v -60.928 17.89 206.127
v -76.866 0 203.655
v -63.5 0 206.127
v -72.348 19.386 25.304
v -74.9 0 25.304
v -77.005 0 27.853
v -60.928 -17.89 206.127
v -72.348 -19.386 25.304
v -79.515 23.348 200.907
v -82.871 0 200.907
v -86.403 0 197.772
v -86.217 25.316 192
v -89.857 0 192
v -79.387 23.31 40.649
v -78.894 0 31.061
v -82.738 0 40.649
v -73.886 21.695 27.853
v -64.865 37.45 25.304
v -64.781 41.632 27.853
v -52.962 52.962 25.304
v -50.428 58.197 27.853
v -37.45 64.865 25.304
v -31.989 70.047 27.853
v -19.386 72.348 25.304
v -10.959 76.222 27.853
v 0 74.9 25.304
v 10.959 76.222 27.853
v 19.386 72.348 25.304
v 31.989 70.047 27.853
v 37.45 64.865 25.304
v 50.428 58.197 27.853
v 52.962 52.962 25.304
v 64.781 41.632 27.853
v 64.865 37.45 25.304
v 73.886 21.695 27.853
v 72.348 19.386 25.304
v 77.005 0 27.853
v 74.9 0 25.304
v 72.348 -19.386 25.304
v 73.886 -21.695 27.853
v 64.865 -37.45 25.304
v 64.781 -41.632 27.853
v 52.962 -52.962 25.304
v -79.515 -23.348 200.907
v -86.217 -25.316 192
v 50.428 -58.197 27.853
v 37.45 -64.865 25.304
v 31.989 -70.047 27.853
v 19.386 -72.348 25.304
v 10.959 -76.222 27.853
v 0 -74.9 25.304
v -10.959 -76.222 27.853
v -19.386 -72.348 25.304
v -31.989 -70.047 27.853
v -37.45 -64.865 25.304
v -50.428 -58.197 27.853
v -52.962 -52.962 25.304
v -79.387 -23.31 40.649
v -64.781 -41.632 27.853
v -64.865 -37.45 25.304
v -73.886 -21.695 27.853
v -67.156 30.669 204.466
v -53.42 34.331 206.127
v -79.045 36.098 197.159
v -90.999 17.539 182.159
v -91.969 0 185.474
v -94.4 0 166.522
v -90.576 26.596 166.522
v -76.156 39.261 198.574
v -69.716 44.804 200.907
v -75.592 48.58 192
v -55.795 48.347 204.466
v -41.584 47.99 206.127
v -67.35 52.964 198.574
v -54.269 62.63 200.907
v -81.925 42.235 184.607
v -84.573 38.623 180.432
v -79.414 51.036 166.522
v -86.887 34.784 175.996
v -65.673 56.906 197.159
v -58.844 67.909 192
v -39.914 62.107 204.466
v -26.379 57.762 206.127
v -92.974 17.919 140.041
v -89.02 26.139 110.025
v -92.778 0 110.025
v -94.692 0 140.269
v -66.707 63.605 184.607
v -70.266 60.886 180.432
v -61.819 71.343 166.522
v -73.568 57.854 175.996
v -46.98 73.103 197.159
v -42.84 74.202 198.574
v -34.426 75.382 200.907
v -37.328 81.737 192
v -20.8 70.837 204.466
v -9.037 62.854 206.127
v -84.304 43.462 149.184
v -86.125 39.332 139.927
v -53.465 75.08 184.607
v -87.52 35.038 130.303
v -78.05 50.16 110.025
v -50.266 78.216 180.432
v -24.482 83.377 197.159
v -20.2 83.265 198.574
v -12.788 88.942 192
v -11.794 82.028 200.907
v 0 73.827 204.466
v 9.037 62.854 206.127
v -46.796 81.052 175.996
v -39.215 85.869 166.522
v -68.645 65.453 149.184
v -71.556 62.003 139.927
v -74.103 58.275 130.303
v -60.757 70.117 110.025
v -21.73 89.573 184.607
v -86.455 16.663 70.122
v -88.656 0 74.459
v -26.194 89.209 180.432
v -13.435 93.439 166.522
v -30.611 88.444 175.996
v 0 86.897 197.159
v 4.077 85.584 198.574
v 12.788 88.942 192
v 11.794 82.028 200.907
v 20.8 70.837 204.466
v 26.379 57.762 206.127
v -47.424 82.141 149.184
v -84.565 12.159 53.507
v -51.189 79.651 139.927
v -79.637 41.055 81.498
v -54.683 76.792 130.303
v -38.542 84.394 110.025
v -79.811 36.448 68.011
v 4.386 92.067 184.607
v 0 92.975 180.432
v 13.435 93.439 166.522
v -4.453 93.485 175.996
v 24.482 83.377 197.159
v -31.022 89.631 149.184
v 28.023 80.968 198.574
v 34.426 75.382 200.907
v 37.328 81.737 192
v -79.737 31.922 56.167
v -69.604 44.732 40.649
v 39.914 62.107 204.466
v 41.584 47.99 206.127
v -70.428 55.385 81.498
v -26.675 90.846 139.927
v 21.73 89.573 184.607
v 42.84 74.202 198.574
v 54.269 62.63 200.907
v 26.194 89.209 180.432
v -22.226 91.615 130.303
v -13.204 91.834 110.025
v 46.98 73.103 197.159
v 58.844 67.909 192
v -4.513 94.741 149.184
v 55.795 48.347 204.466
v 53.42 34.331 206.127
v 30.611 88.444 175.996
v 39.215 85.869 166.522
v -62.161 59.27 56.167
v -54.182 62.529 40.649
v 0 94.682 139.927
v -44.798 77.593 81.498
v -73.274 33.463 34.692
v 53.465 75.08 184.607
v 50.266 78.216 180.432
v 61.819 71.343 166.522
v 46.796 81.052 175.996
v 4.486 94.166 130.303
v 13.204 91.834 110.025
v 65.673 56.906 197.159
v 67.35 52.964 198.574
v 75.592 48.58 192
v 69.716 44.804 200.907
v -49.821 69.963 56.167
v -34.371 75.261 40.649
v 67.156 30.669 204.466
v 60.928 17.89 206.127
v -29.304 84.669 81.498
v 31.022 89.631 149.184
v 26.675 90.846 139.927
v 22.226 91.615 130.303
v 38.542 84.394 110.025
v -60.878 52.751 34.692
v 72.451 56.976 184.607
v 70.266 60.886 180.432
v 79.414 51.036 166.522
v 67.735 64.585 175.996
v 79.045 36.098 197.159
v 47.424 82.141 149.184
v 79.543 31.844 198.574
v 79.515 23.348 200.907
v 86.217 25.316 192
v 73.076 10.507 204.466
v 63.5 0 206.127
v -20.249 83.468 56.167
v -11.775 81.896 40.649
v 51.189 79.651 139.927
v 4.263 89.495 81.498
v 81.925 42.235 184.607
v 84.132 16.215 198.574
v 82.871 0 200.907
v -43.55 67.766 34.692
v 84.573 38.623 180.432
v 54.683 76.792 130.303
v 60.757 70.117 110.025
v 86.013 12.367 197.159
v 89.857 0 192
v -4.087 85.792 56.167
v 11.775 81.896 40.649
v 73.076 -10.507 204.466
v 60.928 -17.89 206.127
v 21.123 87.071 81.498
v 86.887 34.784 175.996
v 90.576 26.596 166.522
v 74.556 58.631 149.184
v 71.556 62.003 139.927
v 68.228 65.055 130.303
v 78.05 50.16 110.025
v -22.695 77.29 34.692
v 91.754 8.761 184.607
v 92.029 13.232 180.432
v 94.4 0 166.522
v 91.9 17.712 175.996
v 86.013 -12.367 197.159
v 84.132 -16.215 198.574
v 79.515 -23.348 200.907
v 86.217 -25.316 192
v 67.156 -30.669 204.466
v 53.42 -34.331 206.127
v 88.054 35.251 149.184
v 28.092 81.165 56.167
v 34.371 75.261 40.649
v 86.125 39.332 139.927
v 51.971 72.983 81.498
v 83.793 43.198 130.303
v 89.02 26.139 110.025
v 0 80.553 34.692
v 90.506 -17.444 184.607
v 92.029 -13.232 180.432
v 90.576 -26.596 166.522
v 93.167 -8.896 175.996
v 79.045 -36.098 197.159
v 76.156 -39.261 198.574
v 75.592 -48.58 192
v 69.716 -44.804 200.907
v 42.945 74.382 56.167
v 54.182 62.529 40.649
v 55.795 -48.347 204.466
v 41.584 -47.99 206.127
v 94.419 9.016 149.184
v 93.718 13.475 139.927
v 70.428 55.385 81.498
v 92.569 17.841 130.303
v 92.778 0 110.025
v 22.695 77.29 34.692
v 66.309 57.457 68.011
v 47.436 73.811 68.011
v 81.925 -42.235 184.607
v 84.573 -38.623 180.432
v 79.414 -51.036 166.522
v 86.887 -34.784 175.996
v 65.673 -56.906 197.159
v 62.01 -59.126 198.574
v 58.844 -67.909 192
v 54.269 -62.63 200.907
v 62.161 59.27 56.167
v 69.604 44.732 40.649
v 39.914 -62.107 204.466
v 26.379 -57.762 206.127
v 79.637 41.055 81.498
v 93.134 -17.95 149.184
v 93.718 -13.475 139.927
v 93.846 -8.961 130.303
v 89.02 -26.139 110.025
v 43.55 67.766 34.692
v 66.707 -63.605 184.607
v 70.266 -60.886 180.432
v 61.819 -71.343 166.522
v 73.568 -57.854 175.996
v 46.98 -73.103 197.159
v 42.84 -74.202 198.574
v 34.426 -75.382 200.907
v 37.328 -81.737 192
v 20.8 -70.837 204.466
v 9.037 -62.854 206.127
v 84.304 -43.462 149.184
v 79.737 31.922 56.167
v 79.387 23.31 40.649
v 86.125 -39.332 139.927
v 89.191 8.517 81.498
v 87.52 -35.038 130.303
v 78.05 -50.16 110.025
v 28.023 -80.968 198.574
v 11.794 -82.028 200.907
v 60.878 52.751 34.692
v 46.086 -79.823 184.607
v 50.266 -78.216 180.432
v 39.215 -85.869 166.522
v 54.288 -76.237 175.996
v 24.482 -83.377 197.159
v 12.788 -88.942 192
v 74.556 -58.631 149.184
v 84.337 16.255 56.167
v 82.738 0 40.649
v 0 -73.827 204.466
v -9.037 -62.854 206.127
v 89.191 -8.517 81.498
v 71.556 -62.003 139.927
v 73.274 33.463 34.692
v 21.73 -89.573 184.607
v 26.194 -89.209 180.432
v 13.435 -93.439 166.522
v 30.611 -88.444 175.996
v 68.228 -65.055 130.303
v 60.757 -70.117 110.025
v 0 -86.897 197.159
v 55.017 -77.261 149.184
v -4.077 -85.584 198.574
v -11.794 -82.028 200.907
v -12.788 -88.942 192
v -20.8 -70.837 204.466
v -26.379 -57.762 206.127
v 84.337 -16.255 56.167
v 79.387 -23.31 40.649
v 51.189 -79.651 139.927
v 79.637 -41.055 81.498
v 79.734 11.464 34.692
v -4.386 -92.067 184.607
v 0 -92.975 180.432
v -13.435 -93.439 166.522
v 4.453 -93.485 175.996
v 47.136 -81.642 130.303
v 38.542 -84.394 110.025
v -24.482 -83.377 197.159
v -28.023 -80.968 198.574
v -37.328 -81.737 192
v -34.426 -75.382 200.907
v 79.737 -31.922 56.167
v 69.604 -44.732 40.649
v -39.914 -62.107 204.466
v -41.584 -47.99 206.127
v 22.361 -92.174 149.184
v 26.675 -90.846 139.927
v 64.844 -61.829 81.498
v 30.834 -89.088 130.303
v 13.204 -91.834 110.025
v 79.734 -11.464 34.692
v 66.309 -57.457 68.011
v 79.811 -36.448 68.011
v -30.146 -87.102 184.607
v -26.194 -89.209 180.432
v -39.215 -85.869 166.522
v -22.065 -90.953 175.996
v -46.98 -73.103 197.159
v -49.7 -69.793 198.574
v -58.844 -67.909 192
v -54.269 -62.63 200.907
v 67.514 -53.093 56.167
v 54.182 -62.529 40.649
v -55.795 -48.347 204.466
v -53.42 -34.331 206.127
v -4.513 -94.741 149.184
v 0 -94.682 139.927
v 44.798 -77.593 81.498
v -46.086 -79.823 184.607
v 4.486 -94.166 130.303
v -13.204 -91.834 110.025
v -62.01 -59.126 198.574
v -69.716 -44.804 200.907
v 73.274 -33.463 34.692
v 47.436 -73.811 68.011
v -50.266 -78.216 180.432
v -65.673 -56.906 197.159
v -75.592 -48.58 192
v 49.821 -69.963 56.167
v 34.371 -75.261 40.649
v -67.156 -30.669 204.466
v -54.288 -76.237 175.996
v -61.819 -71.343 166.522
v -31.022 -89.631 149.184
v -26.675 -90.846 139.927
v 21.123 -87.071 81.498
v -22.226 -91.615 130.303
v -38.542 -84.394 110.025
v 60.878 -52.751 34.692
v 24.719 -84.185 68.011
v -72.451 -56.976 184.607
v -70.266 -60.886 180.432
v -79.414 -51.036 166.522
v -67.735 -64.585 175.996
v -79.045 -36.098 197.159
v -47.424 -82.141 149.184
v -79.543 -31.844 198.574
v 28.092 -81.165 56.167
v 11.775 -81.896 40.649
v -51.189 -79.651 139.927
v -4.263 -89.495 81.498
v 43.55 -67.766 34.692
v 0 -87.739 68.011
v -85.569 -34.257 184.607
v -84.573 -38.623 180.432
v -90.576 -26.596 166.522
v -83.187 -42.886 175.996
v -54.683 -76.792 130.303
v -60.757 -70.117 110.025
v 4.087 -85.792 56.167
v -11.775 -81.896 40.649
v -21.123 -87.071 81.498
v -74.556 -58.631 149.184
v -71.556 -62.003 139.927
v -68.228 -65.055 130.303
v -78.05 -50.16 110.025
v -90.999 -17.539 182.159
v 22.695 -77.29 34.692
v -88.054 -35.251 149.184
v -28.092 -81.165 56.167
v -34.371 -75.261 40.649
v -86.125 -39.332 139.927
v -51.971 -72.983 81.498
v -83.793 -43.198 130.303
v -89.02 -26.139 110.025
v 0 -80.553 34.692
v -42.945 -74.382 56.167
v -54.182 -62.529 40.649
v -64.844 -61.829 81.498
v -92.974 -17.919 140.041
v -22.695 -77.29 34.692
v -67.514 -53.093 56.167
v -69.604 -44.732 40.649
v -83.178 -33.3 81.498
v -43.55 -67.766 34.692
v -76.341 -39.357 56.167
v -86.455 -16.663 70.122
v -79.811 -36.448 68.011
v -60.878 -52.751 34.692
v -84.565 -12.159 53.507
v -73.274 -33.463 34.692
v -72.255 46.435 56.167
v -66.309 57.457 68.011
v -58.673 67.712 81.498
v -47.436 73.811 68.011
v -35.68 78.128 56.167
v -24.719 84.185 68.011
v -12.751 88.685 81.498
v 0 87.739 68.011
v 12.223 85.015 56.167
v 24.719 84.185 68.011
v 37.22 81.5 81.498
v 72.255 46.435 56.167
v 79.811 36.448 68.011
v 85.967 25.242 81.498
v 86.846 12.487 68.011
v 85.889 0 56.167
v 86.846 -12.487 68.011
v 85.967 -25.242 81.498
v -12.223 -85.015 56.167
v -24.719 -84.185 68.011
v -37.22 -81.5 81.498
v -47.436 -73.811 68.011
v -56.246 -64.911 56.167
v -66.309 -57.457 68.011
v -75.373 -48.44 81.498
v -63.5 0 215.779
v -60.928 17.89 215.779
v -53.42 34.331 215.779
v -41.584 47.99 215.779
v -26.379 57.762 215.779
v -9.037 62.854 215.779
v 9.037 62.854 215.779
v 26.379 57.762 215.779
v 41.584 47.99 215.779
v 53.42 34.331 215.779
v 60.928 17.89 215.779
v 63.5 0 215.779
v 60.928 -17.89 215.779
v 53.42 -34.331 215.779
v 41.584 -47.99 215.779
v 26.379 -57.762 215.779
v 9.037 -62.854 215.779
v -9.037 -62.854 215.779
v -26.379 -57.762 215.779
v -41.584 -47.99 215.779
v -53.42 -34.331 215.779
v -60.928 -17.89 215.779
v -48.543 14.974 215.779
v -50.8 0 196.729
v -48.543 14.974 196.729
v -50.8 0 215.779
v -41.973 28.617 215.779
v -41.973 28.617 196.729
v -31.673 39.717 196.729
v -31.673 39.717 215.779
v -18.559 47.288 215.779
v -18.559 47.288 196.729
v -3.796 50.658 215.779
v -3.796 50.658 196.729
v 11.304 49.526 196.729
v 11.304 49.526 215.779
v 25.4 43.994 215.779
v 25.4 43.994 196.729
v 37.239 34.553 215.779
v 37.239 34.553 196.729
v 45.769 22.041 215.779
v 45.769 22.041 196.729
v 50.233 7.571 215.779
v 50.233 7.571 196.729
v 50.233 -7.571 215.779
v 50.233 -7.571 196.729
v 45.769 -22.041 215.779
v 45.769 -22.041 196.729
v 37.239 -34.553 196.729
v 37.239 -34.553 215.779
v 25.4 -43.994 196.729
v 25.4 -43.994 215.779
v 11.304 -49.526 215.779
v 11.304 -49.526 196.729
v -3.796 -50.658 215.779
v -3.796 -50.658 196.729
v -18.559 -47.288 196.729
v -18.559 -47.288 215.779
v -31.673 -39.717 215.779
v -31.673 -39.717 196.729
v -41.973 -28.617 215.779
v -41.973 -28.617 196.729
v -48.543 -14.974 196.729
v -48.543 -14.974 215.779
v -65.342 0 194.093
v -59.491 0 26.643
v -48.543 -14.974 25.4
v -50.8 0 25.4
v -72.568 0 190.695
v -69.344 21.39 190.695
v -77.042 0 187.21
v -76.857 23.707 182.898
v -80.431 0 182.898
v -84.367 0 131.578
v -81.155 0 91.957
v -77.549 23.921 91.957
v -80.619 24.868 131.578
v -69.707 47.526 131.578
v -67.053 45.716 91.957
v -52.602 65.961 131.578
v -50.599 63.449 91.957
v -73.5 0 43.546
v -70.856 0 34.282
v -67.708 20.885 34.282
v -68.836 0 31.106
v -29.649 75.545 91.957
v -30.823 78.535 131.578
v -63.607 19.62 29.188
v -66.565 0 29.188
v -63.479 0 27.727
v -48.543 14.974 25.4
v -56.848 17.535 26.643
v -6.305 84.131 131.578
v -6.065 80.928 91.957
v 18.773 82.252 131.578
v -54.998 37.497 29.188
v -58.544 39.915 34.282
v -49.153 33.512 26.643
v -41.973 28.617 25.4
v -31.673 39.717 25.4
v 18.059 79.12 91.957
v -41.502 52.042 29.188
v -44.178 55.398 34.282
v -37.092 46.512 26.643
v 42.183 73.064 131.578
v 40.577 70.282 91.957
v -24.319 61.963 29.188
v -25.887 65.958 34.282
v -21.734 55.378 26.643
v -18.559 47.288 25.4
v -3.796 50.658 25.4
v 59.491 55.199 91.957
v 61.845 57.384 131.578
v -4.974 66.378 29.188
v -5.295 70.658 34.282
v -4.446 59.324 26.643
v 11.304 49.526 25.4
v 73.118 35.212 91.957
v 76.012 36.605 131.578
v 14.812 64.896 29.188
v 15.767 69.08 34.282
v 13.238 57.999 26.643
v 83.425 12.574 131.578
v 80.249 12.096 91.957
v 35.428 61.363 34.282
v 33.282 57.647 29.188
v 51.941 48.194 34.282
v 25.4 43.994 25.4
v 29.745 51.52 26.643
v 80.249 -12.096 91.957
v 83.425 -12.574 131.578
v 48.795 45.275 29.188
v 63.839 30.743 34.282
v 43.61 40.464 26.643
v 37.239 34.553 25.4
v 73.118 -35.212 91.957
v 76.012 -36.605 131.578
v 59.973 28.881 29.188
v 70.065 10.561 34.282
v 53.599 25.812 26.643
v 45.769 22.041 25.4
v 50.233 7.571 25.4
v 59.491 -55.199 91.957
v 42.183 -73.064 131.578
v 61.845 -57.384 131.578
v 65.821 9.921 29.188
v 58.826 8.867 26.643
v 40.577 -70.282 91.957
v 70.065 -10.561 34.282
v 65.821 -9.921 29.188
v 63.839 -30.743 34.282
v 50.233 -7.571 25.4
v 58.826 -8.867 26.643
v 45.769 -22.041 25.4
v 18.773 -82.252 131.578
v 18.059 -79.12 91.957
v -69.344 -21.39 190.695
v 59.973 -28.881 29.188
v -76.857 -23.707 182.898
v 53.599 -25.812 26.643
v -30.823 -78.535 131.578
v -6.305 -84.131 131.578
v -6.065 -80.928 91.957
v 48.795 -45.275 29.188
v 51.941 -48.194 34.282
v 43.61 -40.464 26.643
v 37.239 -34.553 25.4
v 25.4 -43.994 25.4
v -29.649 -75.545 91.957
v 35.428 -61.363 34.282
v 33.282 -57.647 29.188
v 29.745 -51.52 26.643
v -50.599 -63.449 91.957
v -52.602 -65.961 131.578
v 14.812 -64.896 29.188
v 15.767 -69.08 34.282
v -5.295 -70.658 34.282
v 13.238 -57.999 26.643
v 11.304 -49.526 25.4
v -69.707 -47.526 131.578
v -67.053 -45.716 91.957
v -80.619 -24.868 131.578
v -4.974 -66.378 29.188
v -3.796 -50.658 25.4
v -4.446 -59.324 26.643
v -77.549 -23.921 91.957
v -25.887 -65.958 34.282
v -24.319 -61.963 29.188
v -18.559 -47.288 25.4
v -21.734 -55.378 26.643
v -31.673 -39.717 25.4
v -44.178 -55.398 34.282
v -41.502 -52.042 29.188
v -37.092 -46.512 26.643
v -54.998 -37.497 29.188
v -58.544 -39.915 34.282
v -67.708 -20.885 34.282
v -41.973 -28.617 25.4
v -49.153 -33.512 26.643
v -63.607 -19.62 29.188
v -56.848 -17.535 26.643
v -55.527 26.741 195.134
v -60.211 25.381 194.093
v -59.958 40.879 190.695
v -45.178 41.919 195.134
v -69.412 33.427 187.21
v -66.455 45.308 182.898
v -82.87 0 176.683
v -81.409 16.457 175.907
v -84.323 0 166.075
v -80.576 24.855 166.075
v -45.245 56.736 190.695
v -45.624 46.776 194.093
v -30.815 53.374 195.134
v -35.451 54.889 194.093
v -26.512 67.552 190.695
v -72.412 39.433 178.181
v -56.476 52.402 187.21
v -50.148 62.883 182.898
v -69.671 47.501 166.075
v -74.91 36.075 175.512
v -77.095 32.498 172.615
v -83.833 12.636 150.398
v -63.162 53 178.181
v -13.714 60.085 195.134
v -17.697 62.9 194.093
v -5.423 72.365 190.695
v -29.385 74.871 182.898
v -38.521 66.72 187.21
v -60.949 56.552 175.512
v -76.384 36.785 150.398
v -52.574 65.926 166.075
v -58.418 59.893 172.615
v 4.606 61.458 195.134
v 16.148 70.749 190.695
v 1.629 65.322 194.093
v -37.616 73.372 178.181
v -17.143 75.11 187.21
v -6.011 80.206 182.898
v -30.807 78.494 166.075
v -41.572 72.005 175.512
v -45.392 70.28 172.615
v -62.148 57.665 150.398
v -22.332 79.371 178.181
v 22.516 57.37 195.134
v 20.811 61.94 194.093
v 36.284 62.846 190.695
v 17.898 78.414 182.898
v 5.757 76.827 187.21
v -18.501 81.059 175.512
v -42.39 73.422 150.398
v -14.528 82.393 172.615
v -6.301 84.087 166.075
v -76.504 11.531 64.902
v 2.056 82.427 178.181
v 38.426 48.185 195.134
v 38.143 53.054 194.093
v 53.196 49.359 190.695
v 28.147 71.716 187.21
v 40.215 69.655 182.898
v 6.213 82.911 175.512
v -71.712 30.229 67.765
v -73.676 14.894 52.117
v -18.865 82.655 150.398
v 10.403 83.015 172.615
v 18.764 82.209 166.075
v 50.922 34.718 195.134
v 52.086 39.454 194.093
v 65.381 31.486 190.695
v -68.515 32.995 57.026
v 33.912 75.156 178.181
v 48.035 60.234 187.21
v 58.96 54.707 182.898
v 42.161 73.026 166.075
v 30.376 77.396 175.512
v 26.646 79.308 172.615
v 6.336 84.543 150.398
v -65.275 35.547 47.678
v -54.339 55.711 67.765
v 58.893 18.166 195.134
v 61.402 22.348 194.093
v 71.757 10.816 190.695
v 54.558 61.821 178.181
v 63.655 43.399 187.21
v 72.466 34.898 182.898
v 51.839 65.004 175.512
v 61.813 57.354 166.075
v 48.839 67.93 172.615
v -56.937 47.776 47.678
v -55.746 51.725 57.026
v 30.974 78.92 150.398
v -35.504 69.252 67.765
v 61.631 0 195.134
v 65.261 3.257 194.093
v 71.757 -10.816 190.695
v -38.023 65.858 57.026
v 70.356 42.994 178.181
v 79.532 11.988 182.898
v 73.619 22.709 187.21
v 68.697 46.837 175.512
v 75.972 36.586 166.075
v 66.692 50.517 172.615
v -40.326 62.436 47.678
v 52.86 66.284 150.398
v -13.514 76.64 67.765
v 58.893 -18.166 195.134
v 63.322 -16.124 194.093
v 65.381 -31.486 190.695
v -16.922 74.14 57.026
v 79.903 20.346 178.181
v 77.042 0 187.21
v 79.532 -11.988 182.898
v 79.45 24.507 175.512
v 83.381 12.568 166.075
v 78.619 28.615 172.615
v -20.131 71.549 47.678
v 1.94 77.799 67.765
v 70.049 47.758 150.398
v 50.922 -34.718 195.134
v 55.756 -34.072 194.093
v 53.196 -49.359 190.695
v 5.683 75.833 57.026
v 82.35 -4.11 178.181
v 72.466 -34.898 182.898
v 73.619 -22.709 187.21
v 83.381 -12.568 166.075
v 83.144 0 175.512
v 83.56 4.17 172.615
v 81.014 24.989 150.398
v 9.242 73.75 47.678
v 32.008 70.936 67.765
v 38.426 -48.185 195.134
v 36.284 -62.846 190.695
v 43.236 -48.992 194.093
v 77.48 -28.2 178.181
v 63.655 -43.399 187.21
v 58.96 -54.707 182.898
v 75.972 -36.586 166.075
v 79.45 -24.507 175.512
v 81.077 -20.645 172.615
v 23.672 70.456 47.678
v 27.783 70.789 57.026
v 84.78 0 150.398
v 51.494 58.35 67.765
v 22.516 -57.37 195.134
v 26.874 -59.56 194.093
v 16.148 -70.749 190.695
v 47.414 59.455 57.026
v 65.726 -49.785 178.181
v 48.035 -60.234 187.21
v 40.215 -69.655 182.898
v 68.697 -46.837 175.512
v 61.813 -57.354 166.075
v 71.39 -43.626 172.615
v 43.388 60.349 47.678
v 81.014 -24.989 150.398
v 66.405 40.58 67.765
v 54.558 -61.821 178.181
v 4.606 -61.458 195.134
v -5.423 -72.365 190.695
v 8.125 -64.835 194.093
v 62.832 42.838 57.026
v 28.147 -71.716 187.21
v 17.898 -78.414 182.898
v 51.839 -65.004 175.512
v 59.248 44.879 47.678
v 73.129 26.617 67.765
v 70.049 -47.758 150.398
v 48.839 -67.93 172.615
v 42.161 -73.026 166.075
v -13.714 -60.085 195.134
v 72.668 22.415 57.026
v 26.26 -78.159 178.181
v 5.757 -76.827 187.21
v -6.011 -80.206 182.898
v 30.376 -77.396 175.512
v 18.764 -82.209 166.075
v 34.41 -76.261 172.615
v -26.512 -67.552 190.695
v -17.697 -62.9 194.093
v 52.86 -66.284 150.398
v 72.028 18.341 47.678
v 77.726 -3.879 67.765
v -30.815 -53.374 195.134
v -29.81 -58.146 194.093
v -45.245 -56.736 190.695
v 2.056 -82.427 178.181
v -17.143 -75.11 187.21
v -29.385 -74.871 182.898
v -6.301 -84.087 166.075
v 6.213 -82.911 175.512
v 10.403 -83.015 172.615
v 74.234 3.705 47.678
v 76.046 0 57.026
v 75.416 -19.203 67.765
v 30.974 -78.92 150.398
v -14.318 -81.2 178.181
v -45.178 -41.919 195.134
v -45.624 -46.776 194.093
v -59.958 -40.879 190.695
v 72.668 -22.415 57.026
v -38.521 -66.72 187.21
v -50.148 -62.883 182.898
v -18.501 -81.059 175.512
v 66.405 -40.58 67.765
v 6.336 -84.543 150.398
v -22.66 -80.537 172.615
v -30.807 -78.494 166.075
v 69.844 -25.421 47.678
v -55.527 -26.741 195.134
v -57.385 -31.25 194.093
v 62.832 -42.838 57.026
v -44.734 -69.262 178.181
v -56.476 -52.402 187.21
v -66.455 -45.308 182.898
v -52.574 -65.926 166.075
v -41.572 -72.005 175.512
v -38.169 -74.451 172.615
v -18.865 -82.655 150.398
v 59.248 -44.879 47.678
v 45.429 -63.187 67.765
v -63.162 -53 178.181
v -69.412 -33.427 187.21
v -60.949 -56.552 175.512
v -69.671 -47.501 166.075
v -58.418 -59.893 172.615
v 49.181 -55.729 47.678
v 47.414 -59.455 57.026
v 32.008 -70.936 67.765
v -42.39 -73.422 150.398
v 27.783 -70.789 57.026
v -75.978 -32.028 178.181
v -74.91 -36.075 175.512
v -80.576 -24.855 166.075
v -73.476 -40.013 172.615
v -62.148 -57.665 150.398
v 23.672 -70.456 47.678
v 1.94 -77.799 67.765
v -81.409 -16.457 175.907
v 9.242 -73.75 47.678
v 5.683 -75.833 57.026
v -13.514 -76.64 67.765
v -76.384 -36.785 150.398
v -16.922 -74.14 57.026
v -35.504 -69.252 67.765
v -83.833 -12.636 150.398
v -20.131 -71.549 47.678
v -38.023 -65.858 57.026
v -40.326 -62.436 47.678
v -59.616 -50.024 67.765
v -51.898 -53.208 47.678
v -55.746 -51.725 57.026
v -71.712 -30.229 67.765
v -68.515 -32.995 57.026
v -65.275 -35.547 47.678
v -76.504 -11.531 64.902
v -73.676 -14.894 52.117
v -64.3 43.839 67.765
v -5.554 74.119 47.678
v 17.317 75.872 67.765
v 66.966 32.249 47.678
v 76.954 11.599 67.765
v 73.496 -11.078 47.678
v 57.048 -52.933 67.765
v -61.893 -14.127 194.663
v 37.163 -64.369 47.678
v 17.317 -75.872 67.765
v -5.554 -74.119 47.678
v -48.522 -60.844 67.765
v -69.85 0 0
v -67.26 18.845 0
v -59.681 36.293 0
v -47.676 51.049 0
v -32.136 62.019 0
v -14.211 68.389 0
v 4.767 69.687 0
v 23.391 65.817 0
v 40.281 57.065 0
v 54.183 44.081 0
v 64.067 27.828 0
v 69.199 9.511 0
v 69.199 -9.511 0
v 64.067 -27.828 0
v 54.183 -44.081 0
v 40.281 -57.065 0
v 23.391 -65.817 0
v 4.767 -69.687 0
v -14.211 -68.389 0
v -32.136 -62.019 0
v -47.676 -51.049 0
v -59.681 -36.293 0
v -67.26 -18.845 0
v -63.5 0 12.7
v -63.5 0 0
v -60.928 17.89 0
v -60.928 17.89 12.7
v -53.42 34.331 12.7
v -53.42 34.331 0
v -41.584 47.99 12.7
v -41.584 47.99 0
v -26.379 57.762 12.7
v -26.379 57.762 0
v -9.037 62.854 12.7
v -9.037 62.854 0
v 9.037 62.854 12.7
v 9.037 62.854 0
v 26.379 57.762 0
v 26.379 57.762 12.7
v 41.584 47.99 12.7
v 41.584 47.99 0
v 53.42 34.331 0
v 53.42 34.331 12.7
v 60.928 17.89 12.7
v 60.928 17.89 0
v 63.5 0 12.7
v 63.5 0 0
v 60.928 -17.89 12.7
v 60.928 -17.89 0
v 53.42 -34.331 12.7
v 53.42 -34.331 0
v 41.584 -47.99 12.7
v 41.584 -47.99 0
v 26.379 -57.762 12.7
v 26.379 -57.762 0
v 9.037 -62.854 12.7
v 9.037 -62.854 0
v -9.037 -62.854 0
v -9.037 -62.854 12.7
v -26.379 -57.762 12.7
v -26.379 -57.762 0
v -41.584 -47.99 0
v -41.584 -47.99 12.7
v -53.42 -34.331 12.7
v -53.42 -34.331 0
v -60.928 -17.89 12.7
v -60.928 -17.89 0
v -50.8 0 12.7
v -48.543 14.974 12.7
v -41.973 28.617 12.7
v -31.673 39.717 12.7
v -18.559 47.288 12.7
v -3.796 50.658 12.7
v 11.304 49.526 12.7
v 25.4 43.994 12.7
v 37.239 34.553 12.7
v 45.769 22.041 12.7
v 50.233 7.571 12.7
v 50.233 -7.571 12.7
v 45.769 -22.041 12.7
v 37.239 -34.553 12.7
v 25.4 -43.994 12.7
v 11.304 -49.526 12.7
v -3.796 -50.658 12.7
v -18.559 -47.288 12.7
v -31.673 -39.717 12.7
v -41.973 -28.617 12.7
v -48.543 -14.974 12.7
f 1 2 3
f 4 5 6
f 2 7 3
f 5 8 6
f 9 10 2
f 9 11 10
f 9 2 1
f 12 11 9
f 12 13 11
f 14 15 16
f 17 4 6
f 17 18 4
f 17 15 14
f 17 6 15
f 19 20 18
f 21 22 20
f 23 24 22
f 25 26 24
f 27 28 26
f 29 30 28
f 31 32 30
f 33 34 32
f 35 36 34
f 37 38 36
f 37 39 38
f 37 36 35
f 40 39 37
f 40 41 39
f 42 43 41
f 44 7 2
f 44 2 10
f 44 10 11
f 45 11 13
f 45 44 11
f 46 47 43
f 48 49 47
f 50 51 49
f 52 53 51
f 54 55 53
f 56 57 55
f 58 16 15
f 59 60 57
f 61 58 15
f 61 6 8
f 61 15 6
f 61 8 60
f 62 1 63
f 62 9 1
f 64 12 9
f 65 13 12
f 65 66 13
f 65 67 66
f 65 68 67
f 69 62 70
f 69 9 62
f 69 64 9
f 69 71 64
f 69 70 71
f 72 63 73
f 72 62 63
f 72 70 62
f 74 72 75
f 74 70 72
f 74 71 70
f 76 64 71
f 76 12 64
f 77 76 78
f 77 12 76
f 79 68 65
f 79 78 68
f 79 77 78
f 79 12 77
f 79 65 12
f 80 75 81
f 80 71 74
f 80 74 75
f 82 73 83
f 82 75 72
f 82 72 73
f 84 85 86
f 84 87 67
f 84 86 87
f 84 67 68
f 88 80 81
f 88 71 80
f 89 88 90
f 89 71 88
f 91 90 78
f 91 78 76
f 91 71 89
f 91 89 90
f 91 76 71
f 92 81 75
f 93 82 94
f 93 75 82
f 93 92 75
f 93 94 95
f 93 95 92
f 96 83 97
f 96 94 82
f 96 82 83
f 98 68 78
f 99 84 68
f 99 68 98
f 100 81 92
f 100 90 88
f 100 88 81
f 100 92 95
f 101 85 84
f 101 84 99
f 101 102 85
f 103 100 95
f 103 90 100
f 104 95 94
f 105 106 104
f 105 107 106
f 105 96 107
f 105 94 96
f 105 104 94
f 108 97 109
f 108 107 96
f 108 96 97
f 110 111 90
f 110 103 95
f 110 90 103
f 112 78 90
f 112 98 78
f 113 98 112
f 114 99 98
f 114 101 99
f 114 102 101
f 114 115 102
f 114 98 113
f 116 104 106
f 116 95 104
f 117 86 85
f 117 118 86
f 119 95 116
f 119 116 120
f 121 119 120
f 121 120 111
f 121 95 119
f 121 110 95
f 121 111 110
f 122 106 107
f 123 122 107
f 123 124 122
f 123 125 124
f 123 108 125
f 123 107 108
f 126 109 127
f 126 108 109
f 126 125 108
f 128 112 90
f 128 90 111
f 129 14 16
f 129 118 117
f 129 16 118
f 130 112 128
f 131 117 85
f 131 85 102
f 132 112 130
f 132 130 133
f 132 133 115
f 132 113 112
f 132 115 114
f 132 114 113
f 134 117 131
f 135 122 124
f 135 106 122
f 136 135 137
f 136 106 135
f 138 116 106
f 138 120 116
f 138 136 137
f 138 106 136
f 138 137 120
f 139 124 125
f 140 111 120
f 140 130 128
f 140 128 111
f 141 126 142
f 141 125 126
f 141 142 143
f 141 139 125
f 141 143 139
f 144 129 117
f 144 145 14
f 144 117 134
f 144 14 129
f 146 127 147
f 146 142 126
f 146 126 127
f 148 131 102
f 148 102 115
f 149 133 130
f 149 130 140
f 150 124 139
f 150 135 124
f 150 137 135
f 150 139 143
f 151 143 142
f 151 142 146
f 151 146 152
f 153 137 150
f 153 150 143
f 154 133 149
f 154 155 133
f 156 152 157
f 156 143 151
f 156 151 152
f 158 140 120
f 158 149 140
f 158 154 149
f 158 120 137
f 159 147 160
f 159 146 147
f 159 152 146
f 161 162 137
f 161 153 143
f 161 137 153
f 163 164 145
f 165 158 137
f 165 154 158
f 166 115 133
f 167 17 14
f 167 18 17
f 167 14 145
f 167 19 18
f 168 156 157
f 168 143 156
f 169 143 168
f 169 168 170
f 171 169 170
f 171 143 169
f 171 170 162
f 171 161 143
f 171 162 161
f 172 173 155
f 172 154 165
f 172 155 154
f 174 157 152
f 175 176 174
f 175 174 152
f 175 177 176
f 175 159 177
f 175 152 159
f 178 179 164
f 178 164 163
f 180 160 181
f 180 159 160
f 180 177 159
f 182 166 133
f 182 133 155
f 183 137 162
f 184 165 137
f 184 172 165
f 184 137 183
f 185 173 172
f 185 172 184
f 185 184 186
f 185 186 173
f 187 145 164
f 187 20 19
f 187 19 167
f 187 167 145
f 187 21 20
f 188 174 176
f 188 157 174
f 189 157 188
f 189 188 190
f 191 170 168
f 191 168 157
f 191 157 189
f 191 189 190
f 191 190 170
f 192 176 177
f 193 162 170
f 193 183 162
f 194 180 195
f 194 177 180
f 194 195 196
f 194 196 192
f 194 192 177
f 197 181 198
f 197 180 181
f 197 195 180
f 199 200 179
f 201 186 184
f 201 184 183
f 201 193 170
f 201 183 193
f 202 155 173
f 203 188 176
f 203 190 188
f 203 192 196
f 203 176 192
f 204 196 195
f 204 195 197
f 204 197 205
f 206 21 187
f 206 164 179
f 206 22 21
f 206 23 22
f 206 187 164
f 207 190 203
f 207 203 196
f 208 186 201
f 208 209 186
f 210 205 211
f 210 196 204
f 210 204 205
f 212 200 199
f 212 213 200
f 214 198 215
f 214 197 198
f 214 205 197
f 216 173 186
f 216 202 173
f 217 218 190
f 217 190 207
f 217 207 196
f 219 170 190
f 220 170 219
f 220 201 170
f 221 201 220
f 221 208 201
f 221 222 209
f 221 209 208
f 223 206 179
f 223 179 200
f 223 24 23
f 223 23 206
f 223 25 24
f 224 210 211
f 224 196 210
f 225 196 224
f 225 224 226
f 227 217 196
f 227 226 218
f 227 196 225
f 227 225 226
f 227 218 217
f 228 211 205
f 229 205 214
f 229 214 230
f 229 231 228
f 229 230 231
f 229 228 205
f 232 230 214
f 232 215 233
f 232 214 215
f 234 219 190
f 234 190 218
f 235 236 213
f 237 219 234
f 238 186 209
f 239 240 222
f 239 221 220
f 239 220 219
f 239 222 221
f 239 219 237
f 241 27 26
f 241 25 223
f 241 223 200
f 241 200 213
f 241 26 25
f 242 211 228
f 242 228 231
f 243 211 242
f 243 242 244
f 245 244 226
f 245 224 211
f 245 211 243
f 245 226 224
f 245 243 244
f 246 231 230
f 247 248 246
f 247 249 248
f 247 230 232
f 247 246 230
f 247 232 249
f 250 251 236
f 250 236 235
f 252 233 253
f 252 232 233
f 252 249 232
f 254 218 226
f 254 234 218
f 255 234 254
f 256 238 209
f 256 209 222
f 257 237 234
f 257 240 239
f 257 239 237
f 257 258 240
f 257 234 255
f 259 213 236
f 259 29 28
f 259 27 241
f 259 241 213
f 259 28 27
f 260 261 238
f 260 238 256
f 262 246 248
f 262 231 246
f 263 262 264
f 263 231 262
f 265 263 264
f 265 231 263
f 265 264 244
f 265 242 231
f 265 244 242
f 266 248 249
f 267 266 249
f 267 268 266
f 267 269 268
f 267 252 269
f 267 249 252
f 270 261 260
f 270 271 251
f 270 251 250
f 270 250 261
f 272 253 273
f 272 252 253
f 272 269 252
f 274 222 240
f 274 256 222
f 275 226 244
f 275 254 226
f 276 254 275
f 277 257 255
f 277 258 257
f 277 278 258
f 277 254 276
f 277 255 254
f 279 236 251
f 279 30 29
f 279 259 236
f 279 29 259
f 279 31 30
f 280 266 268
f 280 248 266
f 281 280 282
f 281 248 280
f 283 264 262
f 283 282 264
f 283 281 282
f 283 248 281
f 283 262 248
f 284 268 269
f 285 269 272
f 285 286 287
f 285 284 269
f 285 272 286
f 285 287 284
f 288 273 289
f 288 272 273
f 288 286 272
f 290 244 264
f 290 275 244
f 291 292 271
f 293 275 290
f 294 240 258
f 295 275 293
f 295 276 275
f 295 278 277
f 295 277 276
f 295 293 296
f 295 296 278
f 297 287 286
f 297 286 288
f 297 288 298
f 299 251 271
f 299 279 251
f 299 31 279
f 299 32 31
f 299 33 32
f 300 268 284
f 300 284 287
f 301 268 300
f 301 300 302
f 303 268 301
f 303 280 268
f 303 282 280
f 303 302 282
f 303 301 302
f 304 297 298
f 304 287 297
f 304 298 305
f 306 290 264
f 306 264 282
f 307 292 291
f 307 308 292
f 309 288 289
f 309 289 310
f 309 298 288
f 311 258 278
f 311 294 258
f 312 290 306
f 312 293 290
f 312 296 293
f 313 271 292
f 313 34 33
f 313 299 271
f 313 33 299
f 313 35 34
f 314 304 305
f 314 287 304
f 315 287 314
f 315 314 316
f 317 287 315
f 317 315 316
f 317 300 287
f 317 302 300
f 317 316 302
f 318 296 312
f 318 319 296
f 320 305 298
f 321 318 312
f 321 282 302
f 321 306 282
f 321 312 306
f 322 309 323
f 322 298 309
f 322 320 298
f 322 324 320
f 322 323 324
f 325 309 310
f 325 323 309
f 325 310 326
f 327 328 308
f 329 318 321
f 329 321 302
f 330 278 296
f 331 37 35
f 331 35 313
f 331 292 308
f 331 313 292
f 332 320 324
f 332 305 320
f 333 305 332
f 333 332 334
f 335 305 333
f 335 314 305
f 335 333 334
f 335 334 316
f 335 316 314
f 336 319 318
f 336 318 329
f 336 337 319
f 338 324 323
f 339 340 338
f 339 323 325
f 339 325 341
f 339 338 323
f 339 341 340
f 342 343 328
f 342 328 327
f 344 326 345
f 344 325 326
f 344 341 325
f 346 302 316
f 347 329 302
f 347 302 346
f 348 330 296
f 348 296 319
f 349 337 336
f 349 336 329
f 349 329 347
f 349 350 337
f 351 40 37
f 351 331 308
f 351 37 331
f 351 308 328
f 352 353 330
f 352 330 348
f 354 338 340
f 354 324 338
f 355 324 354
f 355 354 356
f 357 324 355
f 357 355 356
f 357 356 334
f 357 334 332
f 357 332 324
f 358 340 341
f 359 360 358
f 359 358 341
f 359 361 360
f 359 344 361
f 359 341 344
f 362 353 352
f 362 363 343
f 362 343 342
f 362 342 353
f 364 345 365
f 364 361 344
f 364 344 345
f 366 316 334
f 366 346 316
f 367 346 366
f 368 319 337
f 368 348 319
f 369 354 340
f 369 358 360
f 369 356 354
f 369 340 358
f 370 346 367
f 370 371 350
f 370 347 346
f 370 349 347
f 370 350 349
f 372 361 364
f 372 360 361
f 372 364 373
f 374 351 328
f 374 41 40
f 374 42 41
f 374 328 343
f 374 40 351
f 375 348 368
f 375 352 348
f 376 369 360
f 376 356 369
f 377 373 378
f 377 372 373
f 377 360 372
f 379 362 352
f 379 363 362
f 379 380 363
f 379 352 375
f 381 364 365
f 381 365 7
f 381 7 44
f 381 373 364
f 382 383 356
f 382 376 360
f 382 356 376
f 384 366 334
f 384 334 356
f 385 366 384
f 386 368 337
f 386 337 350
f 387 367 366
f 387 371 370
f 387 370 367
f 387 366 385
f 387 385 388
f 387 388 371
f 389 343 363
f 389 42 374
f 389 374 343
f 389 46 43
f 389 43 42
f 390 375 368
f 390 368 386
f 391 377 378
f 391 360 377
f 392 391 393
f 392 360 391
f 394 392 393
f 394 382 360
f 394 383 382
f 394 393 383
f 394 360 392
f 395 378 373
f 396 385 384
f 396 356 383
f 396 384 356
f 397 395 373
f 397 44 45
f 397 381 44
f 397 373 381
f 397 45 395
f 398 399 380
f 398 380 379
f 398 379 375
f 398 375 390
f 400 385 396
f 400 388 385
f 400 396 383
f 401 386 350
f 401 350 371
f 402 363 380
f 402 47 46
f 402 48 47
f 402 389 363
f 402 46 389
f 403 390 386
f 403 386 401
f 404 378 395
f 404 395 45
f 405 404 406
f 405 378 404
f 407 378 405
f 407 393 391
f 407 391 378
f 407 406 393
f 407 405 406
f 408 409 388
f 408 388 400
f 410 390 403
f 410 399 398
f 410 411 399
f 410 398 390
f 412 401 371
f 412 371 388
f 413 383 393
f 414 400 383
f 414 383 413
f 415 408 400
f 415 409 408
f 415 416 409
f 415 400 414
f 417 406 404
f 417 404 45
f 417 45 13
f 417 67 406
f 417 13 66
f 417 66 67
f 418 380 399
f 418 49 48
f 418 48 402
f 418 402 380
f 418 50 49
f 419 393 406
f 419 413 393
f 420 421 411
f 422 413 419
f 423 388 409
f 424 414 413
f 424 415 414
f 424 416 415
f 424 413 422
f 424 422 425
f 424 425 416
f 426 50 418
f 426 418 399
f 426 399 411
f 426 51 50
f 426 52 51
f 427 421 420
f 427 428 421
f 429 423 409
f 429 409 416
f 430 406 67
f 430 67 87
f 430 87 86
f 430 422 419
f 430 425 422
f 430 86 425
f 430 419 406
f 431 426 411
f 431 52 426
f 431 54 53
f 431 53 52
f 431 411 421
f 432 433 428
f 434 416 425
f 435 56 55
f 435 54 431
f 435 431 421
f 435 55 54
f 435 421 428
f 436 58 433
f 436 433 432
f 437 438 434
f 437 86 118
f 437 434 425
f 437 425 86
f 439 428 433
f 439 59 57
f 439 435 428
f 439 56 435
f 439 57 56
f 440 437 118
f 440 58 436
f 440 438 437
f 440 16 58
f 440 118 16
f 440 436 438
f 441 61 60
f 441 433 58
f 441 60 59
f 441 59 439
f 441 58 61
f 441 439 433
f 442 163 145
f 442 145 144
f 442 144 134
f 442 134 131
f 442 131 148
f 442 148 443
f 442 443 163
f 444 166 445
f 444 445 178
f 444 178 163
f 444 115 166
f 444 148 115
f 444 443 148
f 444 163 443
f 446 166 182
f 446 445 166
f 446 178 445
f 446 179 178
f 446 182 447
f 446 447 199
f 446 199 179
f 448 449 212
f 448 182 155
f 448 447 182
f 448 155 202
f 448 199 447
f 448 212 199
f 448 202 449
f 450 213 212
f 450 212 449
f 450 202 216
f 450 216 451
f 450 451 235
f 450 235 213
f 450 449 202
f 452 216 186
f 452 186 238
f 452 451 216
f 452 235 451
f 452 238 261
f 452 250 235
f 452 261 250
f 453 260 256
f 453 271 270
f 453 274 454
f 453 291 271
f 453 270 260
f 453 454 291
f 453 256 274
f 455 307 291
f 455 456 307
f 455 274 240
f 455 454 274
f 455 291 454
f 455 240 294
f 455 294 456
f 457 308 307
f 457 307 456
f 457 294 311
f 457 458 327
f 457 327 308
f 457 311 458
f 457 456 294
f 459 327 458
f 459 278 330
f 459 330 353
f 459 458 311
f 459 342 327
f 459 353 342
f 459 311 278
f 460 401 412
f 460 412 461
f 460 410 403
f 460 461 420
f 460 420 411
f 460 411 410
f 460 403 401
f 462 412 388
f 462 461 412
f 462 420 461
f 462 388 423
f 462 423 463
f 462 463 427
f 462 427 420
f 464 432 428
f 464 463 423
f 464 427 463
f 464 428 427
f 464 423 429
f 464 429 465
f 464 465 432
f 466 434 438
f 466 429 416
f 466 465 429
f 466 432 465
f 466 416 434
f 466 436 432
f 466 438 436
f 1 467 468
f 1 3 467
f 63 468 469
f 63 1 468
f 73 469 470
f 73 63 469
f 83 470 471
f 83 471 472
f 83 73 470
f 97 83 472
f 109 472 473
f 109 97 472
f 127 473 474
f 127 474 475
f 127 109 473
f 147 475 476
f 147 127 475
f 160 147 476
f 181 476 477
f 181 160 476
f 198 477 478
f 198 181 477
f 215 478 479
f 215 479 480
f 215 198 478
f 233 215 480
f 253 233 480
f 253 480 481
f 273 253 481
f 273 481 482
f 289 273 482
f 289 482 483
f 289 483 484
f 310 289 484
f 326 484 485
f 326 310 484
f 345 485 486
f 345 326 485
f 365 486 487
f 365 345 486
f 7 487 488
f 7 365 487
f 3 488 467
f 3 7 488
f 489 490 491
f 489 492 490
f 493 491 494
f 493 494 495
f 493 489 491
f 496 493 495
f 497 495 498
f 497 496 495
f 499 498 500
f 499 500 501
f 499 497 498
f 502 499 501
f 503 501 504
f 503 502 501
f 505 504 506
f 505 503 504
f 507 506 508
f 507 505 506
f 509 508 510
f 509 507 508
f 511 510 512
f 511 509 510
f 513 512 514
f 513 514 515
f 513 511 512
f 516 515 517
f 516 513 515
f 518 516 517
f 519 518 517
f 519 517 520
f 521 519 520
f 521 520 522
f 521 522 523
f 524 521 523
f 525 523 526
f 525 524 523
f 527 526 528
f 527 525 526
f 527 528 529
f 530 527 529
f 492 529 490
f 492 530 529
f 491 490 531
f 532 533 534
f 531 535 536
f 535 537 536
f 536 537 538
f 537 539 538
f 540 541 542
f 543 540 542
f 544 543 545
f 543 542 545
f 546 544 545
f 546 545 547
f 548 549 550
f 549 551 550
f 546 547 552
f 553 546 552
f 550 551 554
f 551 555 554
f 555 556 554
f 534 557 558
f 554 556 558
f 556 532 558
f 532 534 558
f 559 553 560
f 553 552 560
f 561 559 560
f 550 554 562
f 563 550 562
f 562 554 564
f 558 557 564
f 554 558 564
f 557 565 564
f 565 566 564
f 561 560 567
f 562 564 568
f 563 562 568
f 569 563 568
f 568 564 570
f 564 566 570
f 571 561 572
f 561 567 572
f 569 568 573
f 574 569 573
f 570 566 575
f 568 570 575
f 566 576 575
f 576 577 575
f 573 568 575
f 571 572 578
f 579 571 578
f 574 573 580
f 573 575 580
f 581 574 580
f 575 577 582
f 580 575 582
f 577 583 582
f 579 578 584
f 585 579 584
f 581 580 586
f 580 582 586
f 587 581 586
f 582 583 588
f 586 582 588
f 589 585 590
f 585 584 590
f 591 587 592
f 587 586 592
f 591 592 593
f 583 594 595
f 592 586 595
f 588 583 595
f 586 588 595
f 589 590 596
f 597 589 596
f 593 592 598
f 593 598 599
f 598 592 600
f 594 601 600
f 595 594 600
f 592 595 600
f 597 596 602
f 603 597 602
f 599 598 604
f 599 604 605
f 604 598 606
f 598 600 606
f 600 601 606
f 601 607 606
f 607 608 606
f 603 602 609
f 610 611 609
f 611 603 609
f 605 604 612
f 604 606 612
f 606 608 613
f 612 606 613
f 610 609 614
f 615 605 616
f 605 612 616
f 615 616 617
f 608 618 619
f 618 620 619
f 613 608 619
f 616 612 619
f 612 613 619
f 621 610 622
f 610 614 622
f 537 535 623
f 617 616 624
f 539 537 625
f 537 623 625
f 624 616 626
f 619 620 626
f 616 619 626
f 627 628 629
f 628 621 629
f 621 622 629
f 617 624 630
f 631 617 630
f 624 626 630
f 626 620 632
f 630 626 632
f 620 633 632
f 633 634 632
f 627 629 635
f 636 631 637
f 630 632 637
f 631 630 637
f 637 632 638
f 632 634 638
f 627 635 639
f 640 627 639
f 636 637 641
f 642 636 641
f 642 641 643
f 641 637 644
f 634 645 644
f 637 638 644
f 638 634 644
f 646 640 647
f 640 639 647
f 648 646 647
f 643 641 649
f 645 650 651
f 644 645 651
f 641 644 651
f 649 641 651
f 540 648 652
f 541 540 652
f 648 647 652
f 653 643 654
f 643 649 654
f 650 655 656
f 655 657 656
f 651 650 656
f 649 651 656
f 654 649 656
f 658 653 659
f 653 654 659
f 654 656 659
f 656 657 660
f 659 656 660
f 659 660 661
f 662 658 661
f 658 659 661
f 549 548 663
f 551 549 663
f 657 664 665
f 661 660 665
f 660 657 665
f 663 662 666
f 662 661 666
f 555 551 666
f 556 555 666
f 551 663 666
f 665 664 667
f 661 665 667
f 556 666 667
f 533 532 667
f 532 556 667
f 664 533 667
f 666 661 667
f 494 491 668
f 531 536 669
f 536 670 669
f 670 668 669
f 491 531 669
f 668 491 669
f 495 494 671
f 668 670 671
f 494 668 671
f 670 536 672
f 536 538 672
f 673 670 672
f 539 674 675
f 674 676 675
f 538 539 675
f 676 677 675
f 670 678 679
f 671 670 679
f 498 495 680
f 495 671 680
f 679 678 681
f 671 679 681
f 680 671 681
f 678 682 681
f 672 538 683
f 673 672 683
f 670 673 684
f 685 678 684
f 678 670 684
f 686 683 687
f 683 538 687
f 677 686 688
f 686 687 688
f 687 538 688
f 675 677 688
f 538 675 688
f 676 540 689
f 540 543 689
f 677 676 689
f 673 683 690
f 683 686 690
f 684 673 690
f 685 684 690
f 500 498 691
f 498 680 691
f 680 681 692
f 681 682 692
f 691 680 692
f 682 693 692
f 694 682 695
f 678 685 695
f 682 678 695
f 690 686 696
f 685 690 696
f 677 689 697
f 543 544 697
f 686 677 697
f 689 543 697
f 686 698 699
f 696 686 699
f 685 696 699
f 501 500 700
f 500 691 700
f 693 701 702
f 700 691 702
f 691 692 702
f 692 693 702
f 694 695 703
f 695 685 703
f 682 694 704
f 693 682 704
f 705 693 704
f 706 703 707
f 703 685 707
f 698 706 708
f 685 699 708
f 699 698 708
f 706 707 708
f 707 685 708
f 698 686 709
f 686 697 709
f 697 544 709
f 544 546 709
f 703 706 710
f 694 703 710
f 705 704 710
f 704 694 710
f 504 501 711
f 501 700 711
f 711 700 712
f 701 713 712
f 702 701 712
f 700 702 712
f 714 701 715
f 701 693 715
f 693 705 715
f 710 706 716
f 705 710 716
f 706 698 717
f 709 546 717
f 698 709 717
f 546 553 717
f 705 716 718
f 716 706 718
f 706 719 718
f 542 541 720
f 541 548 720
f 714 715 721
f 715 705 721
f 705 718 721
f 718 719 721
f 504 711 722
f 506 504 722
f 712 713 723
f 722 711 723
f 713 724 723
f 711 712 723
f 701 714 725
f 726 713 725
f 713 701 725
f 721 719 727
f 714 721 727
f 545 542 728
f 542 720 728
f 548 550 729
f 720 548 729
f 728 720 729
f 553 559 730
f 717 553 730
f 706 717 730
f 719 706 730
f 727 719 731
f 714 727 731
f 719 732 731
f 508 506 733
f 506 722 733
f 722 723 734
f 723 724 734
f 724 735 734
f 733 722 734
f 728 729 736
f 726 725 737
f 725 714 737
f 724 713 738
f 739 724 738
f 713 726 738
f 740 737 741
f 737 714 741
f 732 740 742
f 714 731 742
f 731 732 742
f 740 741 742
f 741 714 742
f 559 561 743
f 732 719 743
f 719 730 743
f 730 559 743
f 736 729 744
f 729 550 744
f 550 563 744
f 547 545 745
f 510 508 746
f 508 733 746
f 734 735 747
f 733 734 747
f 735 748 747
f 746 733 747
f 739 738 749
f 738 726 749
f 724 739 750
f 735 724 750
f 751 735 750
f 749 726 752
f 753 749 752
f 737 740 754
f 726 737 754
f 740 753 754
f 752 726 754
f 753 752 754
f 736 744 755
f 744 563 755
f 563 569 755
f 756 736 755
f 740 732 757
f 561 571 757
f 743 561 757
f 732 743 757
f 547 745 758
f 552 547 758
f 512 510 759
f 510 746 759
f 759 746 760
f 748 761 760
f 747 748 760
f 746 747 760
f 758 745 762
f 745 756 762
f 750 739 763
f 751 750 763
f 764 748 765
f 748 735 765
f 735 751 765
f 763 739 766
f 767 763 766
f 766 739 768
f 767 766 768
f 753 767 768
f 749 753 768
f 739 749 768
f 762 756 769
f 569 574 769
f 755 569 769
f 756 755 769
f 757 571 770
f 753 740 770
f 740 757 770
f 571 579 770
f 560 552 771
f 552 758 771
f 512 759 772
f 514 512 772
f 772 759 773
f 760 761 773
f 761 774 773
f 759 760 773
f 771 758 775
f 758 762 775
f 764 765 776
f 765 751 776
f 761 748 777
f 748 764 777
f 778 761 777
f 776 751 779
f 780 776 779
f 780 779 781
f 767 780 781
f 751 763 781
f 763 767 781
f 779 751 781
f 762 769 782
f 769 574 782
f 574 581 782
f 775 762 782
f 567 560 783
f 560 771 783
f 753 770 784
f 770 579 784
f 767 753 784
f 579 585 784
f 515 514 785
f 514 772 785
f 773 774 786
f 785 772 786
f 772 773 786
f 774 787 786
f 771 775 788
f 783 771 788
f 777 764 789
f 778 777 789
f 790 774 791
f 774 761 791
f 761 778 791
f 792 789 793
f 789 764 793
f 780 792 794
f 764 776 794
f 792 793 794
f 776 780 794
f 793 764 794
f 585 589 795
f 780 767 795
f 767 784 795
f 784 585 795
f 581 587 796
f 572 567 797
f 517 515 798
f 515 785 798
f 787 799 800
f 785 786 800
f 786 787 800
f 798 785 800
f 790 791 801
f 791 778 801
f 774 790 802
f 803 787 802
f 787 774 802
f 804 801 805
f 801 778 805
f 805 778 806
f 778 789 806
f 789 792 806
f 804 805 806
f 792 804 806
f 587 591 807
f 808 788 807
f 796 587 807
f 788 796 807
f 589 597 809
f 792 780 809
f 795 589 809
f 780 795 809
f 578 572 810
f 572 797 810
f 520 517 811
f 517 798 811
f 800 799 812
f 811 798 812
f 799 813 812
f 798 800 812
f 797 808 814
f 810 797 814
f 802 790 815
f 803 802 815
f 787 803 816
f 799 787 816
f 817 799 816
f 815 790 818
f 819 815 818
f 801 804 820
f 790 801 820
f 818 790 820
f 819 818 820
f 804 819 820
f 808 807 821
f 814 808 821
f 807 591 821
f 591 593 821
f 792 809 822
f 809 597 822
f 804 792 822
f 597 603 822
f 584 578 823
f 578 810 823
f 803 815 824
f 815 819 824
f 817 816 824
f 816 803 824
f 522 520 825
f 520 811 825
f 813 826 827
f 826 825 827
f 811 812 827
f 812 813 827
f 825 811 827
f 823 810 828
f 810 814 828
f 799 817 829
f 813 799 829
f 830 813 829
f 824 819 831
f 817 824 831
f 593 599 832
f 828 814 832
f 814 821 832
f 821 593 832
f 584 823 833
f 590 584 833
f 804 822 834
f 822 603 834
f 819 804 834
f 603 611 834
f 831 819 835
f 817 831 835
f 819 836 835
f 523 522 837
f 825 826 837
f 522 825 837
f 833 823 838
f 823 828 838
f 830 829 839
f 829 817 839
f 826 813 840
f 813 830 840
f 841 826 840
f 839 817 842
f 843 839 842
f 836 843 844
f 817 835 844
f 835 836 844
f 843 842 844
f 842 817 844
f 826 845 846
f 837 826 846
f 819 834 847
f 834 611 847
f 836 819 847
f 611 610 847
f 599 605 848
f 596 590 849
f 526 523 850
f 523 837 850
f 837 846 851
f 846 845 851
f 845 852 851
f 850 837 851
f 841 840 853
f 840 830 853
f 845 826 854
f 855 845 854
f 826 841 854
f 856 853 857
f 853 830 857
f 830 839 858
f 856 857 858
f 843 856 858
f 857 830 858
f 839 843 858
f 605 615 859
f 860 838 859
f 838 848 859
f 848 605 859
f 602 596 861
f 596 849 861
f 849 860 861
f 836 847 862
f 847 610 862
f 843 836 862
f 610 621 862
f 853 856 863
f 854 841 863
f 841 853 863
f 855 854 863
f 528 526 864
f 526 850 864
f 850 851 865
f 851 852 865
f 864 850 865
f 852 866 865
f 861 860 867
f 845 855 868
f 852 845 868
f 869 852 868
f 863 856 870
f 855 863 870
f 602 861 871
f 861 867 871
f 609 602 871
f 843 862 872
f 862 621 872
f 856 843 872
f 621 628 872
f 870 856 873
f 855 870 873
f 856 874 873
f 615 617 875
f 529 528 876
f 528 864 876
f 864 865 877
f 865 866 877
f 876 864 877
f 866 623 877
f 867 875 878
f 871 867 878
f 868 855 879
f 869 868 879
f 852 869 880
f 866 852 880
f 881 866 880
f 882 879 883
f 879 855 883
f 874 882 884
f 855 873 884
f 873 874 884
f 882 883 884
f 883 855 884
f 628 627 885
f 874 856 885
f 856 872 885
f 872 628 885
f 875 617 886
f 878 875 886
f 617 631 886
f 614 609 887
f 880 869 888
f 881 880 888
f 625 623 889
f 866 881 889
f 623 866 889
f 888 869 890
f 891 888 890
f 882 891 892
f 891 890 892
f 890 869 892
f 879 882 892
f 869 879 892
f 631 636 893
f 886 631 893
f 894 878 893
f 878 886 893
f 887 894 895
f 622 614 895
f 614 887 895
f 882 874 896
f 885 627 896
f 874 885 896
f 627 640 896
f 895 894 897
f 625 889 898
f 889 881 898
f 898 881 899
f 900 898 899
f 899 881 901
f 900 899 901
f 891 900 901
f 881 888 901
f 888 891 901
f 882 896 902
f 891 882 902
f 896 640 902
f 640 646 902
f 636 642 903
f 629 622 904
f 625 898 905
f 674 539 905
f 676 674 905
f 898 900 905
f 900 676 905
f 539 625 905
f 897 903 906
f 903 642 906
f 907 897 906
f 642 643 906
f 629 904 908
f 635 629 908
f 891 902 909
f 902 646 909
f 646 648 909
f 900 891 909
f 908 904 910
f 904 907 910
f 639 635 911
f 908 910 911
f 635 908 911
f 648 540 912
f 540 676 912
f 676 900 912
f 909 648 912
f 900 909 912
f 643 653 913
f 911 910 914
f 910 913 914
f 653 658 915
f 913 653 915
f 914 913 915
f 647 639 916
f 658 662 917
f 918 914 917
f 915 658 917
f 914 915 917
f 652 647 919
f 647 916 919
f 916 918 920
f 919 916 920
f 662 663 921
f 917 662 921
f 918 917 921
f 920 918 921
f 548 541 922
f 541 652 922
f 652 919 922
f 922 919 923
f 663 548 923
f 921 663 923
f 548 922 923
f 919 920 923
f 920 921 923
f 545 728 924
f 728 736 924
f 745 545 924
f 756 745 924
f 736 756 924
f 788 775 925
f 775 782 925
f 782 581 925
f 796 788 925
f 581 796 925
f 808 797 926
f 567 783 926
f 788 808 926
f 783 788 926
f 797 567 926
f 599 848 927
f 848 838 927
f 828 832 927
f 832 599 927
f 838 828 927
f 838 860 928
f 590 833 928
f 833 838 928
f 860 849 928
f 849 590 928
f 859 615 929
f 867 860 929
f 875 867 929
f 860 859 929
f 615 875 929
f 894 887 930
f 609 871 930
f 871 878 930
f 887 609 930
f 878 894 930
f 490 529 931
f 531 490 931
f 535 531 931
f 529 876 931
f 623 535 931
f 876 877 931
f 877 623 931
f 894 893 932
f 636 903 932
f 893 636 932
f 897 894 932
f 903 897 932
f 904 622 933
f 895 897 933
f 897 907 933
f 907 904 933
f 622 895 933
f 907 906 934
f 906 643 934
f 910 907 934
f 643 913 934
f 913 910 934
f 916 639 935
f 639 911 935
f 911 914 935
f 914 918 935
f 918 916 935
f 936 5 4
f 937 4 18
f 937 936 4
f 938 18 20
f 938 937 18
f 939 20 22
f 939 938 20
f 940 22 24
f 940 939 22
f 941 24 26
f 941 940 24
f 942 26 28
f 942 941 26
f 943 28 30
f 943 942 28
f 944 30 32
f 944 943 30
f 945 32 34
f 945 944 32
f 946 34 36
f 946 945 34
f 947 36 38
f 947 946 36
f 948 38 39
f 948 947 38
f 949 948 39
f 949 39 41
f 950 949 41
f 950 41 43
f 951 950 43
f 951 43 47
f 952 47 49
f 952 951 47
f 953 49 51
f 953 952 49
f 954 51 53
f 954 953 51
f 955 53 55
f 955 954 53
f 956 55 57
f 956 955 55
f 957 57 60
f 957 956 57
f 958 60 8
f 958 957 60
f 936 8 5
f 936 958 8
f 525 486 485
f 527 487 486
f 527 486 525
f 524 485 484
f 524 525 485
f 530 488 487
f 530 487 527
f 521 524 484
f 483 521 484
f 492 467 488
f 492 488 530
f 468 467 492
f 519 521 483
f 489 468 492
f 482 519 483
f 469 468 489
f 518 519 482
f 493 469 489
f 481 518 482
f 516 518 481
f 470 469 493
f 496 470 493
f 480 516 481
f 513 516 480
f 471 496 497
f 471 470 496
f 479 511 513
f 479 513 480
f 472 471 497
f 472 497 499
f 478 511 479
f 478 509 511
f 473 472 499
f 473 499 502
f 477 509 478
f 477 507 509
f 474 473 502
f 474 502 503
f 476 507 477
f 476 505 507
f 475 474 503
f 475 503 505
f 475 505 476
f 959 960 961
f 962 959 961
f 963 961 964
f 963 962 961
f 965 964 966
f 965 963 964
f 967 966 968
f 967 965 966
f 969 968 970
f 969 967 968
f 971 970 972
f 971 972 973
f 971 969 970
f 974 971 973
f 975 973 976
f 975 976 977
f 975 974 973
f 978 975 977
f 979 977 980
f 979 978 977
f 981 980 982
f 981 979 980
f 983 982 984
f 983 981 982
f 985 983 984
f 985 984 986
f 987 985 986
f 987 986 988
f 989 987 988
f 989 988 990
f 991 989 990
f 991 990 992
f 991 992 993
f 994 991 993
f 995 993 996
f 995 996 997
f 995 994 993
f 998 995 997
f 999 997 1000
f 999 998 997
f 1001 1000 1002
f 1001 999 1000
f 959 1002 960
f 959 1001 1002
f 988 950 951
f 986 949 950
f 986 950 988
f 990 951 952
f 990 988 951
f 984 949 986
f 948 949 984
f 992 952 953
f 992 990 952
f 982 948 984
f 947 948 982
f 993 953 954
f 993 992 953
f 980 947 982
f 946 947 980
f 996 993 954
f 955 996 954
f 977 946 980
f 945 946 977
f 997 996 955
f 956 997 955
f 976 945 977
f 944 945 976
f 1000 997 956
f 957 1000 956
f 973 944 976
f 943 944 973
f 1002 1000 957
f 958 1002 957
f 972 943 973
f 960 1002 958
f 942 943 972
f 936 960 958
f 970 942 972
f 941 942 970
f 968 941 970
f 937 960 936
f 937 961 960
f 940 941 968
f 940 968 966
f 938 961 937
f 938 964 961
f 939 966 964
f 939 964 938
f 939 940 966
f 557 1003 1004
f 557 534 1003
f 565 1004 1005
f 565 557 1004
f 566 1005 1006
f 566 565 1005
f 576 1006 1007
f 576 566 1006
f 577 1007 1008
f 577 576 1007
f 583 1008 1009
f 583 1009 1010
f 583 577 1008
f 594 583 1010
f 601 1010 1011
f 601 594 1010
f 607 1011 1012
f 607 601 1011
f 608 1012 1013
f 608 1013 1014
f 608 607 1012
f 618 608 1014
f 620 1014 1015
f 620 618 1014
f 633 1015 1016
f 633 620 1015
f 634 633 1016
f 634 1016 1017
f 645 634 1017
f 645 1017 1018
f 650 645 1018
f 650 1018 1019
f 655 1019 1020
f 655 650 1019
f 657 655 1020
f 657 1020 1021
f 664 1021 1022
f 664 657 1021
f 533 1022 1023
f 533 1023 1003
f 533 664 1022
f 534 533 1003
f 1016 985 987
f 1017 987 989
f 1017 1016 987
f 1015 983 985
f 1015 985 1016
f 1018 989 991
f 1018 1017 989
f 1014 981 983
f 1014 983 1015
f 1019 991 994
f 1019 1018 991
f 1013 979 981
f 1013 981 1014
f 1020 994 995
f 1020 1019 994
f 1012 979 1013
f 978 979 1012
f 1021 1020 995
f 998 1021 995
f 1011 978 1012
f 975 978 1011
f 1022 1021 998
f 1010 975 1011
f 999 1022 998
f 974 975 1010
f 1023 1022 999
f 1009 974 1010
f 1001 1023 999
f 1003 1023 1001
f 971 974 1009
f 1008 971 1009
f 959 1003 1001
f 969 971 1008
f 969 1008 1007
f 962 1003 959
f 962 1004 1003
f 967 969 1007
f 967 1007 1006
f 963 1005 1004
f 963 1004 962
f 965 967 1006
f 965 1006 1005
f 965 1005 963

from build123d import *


with BuildPart() as f1:
    # F0 (on Front) → F1 (revolve)
    with BuildSketch(Plane.XZ):
        with BuildLine():
            Line((-63.5, 12.7), (-50.8, 12.7))
            Line((-50.8, 12.7), (-50.8, 25.4))
            add(Edge.make_bspline(
                [(-50.8, 196.7292263527), (-55.4893262235, 196.2039625073), (-65.8545906197, 195.2600382897), (-82.0716172237, 185.3475962145), (-85.641164119, 162.1853411346), (-83.9697627929, 103.8795101599), (-74.5619746661, 46.4580197926), (-69.7616856244, 27.6024186187), (-57.2313578049, 26.1272115119), (-50.8, 25.4)],
                knots=[0, 0, 0, 0, 0.1069763712, 0.2200221229, 0.3466449315, 0.5617326258, 0.7753448222, 0.8856365704, 1, 1, 1, 1], degree=3))
            Line((-50.8, 196.7292263527), (-50.8, 215.7792263527))
            Line((-50.8, 215.7792263527), (-63.5, 215.7792263527))
            Line((-63.5, 215.7792263527), (-63.5, 206.1272263527))
            add(Edge.make_bspline(
                [(-63.5, 206.1272263527), (-71.4575969978, 205.063067953), (-89.5377256718, 203.0171096587), (-96.2050962488, 165.8234545976), (-93.7919861007, 107.3007174993), (-84.5384389717, 44.7397990425), (-81.0886634133, 35.8235857126), (-77.7536841536, 28.1368566047), (-74.900061506, 25.303710252)],
                knots=[0, 0, 0, 0, 0.1456235773, 0.3172765114, 0.5641615023, 0.8027610497, 0.8960181934, 1, 1, 1, 1], degree=3))
            Line((-74.900061506, 25.303710252), (-69.85, 0))
            Line((-69.85, 0), (-63.5, 0))
            Line((-63.5, 0), (-63.5, 12.7))
        make_face()
    revolve(axis=Axis((0, 0, 107.7804267406), (0, 0, -1)))


solid = f1.part
